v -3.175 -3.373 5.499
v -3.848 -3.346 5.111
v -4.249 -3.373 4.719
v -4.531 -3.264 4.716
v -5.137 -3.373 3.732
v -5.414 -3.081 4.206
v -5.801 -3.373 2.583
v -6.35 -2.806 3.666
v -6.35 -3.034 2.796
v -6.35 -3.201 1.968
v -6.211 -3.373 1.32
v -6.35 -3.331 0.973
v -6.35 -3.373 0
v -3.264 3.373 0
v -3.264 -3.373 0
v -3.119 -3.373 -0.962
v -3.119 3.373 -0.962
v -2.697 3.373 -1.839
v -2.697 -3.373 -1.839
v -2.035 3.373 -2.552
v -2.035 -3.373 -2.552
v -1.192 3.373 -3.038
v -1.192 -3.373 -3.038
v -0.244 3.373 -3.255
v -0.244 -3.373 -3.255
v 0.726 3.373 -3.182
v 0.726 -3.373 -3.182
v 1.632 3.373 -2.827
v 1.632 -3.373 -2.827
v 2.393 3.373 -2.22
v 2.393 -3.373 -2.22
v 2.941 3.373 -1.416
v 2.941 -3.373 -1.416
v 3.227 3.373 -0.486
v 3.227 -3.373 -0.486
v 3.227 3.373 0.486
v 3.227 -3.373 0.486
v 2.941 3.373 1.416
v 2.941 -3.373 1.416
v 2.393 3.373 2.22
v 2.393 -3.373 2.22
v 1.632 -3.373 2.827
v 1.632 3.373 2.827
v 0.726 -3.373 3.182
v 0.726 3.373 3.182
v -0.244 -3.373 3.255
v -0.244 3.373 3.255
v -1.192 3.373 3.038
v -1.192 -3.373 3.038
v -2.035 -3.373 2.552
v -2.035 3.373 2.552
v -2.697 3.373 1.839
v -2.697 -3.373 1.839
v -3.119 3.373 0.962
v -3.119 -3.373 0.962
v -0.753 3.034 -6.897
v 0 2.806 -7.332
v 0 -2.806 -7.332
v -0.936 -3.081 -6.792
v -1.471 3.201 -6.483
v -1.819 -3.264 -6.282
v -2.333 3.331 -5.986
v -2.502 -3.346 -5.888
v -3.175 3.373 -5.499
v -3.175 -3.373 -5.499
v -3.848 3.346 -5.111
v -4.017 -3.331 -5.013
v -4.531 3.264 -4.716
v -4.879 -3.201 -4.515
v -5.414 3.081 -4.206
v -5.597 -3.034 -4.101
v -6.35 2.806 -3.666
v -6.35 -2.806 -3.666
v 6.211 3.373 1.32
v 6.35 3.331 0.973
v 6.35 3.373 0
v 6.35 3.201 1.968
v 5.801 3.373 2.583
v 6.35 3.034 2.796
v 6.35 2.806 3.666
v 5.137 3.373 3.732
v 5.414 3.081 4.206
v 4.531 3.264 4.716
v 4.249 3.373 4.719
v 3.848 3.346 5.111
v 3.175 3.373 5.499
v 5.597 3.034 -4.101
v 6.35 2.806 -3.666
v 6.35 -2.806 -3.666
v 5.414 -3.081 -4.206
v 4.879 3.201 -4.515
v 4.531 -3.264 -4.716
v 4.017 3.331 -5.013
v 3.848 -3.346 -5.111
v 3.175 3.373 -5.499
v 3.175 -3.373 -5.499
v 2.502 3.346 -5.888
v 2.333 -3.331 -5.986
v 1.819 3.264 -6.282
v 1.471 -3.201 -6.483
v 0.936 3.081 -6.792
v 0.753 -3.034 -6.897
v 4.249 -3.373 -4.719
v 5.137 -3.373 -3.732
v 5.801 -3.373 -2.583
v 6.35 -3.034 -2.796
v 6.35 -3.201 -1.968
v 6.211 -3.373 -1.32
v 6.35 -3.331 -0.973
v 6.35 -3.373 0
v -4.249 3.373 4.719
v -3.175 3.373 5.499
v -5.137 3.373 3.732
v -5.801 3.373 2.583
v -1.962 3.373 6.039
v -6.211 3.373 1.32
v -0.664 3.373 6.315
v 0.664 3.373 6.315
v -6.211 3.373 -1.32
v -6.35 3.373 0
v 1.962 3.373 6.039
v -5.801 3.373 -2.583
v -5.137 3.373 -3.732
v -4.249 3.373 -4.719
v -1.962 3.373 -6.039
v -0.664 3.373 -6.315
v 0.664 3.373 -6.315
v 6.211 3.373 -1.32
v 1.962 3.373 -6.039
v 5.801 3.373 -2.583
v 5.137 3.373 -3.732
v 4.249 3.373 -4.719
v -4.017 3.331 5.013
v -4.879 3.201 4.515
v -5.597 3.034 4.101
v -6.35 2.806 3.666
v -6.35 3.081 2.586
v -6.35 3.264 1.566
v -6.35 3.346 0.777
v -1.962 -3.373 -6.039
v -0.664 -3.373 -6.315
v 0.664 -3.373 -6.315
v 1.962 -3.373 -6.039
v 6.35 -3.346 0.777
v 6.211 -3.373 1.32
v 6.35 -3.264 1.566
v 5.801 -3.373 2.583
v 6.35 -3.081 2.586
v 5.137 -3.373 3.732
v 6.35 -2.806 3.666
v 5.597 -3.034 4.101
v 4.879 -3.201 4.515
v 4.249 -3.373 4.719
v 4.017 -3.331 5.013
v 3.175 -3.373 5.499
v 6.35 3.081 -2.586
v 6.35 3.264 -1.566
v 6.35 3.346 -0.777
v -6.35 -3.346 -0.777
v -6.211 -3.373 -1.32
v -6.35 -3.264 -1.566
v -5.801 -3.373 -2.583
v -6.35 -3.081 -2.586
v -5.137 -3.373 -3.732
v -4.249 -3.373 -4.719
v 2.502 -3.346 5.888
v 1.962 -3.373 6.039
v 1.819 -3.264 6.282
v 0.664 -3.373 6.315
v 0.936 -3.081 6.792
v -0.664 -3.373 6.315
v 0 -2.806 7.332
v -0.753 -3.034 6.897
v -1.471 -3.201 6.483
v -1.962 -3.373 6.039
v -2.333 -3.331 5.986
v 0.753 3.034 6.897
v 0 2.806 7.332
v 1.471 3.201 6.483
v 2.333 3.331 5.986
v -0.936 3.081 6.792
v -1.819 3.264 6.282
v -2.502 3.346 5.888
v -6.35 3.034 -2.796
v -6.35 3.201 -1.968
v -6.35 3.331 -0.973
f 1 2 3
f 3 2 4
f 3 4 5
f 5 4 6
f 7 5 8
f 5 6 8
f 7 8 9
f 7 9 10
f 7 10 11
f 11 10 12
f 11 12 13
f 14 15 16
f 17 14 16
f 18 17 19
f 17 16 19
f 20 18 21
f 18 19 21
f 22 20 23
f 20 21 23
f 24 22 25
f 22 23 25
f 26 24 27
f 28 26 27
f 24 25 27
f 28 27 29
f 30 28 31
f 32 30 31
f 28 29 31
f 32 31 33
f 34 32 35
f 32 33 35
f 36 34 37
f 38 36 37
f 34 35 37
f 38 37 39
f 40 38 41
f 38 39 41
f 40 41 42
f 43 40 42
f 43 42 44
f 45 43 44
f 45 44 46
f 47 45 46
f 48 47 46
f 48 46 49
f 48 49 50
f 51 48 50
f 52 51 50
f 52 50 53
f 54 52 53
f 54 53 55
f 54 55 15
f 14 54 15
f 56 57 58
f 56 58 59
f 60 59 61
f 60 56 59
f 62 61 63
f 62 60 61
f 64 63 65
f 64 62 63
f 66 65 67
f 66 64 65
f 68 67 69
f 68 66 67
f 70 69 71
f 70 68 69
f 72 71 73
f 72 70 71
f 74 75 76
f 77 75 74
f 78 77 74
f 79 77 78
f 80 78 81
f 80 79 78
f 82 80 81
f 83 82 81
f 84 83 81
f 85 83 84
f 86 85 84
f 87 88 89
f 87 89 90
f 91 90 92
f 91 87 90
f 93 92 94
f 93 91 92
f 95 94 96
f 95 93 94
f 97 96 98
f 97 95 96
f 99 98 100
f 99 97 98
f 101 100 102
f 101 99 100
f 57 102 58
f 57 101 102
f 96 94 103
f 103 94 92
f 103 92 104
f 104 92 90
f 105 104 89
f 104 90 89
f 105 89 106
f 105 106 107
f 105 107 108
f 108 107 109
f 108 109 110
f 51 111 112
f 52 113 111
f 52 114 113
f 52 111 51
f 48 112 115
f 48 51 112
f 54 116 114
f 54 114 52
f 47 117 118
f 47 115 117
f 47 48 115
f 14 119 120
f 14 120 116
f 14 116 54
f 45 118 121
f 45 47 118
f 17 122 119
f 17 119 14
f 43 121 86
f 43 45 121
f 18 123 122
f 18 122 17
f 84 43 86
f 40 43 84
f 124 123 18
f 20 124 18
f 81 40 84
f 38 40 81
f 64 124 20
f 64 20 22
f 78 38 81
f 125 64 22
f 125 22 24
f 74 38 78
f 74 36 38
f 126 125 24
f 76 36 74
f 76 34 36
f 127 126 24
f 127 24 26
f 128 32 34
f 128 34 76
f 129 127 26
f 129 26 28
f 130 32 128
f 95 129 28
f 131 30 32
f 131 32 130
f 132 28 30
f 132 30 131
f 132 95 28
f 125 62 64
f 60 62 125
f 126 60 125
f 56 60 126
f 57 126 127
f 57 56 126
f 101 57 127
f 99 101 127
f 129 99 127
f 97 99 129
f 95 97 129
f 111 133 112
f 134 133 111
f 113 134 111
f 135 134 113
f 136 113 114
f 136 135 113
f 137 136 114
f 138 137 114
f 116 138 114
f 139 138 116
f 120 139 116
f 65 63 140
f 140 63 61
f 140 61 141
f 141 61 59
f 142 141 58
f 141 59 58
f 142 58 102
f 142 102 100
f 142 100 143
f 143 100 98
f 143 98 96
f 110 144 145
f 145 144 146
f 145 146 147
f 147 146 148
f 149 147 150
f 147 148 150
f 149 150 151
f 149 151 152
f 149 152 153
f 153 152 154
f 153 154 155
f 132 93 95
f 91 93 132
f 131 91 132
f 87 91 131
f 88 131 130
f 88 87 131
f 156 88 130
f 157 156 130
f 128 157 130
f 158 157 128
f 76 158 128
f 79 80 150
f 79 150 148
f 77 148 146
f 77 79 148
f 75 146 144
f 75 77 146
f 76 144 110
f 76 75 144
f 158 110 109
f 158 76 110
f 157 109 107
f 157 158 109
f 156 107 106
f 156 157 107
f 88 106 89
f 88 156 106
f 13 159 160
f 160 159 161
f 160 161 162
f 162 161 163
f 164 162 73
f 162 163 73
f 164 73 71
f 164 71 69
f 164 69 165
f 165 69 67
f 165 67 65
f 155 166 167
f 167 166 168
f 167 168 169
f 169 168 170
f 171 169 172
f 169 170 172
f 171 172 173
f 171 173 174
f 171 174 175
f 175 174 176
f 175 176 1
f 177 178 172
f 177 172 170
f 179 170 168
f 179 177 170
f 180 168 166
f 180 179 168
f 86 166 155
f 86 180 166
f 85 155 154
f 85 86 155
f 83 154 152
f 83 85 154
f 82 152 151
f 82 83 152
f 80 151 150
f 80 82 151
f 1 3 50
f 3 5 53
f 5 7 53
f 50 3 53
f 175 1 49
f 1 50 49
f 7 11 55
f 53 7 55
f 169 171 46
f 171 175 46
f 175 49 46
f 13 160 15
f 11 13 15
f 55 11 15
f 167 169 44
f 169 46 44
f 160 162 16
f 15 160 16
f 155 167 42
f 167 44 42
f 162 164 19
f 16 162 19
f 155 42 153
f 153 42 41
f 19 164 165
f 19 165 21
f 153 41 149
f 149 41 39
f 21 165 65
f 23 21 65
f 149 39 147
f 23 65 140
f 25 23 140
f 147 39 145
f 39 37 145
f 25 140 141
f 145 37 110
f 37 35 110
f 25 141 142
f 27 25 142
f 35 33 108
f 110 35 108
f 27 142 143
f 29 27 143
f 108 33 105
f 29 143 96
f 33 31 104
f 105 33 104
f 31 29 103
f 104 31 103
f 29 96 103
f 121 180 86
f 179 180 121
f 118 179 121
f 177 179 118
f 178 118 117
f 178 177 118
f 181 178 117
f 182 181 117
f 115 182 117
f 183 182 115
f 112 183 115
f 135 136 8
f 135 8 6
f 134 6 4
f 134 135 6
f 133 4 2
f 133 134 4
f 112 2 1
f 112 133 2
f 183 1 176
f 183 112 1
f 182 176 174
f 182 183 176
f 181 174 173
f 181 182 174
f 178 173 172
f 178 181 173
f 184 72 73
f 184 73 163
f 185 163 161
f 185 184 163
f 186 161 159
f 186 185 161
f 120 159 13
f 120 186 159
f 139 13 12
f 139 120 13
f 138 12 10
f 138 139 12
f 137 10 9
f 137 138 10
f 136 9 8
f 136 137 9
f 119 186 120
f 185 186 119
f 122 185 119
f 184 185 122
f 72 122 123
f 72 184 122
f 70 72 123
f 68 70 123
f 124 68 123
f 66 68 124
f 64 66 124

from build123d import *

# Parameters (mm, degrees)
BOSS_EXTRUDE1_DEPTH      = 3.3734375
BOSS_EXTRUDE1_DEPTH_BACK = 3.3734375
SKETCH2_OUTSIDE_W        = 45.644
SKETCH2_OUTSIDE_H        = 47.608
SKETCH2_OUTSIDE_R        = 6.35
CUT_EXTRUDE1_DEPTH       = 7.746875
CUT_EXTRUDE1_TAPER       = 60
F_5_16_18_TAPPED_HOLE1_D = 6.5278


with BuildPart() as part:
    # Sketch1 → Boss-Extrude1 (new body, two sides)
    with BuildSketch(Plane(origin=(0, 0, 0), x_dir=(1, 0, 0), z_dir=(0, 1, 0))) as boss_extrude1_sk:
        Polygon((6.35, -3.666174209), (6.35, 3.666174209), (0, 7.332348419), (-6.35, 3.666174209), (-6.35, -3.666174209), (0, -7.332348419), align=None)
    extrude(amount=BOSS_EXTRUDE1_DEPTH)
    extrude(boss_extrude1_sk.sketch, amount=-BOSS_EXTRUDE1_DEPTH_BACK)

    # Sketch2 outside → Cut-Extrude1 (cut, through all)
    with BuildSketch(Plane(origin=(0, 3.3734375, 0), x_dir=(1, 0, 0), z_dir=(0, 1, 0))):
        Rectangle(SKETCH2_OUTSIDE_W, SKETCH2_OUTSIDE_H)
        Circle(SKETCH2_OUTSIDE_R, mode=Mode.SUBTRACT)
    cut_extrude1 = extrude(amount=-CUT_EXTRUDE1_DEPTH, taper=CUT_EXTRUDE1_TAPER, mode=Mode.SUBTRACT)

    # Mirror1: Cut-Extrude1 across plane
    add(cut_extrude1.mirror(Plane.ZX), mode=Mode.SUBTRACT)

    # 5/16-18 Tapped Hole1 (through all)
    with Locations(Plane(origin=(0, 3.3734375, 0), x_dir=(1, 0, 0), z_dir=(0, 1, 0))):
        with Locations((0, 0)):
            Hole(F_5_16_18_TAPPED_HOLE1_D / 2)


solid = part.part
